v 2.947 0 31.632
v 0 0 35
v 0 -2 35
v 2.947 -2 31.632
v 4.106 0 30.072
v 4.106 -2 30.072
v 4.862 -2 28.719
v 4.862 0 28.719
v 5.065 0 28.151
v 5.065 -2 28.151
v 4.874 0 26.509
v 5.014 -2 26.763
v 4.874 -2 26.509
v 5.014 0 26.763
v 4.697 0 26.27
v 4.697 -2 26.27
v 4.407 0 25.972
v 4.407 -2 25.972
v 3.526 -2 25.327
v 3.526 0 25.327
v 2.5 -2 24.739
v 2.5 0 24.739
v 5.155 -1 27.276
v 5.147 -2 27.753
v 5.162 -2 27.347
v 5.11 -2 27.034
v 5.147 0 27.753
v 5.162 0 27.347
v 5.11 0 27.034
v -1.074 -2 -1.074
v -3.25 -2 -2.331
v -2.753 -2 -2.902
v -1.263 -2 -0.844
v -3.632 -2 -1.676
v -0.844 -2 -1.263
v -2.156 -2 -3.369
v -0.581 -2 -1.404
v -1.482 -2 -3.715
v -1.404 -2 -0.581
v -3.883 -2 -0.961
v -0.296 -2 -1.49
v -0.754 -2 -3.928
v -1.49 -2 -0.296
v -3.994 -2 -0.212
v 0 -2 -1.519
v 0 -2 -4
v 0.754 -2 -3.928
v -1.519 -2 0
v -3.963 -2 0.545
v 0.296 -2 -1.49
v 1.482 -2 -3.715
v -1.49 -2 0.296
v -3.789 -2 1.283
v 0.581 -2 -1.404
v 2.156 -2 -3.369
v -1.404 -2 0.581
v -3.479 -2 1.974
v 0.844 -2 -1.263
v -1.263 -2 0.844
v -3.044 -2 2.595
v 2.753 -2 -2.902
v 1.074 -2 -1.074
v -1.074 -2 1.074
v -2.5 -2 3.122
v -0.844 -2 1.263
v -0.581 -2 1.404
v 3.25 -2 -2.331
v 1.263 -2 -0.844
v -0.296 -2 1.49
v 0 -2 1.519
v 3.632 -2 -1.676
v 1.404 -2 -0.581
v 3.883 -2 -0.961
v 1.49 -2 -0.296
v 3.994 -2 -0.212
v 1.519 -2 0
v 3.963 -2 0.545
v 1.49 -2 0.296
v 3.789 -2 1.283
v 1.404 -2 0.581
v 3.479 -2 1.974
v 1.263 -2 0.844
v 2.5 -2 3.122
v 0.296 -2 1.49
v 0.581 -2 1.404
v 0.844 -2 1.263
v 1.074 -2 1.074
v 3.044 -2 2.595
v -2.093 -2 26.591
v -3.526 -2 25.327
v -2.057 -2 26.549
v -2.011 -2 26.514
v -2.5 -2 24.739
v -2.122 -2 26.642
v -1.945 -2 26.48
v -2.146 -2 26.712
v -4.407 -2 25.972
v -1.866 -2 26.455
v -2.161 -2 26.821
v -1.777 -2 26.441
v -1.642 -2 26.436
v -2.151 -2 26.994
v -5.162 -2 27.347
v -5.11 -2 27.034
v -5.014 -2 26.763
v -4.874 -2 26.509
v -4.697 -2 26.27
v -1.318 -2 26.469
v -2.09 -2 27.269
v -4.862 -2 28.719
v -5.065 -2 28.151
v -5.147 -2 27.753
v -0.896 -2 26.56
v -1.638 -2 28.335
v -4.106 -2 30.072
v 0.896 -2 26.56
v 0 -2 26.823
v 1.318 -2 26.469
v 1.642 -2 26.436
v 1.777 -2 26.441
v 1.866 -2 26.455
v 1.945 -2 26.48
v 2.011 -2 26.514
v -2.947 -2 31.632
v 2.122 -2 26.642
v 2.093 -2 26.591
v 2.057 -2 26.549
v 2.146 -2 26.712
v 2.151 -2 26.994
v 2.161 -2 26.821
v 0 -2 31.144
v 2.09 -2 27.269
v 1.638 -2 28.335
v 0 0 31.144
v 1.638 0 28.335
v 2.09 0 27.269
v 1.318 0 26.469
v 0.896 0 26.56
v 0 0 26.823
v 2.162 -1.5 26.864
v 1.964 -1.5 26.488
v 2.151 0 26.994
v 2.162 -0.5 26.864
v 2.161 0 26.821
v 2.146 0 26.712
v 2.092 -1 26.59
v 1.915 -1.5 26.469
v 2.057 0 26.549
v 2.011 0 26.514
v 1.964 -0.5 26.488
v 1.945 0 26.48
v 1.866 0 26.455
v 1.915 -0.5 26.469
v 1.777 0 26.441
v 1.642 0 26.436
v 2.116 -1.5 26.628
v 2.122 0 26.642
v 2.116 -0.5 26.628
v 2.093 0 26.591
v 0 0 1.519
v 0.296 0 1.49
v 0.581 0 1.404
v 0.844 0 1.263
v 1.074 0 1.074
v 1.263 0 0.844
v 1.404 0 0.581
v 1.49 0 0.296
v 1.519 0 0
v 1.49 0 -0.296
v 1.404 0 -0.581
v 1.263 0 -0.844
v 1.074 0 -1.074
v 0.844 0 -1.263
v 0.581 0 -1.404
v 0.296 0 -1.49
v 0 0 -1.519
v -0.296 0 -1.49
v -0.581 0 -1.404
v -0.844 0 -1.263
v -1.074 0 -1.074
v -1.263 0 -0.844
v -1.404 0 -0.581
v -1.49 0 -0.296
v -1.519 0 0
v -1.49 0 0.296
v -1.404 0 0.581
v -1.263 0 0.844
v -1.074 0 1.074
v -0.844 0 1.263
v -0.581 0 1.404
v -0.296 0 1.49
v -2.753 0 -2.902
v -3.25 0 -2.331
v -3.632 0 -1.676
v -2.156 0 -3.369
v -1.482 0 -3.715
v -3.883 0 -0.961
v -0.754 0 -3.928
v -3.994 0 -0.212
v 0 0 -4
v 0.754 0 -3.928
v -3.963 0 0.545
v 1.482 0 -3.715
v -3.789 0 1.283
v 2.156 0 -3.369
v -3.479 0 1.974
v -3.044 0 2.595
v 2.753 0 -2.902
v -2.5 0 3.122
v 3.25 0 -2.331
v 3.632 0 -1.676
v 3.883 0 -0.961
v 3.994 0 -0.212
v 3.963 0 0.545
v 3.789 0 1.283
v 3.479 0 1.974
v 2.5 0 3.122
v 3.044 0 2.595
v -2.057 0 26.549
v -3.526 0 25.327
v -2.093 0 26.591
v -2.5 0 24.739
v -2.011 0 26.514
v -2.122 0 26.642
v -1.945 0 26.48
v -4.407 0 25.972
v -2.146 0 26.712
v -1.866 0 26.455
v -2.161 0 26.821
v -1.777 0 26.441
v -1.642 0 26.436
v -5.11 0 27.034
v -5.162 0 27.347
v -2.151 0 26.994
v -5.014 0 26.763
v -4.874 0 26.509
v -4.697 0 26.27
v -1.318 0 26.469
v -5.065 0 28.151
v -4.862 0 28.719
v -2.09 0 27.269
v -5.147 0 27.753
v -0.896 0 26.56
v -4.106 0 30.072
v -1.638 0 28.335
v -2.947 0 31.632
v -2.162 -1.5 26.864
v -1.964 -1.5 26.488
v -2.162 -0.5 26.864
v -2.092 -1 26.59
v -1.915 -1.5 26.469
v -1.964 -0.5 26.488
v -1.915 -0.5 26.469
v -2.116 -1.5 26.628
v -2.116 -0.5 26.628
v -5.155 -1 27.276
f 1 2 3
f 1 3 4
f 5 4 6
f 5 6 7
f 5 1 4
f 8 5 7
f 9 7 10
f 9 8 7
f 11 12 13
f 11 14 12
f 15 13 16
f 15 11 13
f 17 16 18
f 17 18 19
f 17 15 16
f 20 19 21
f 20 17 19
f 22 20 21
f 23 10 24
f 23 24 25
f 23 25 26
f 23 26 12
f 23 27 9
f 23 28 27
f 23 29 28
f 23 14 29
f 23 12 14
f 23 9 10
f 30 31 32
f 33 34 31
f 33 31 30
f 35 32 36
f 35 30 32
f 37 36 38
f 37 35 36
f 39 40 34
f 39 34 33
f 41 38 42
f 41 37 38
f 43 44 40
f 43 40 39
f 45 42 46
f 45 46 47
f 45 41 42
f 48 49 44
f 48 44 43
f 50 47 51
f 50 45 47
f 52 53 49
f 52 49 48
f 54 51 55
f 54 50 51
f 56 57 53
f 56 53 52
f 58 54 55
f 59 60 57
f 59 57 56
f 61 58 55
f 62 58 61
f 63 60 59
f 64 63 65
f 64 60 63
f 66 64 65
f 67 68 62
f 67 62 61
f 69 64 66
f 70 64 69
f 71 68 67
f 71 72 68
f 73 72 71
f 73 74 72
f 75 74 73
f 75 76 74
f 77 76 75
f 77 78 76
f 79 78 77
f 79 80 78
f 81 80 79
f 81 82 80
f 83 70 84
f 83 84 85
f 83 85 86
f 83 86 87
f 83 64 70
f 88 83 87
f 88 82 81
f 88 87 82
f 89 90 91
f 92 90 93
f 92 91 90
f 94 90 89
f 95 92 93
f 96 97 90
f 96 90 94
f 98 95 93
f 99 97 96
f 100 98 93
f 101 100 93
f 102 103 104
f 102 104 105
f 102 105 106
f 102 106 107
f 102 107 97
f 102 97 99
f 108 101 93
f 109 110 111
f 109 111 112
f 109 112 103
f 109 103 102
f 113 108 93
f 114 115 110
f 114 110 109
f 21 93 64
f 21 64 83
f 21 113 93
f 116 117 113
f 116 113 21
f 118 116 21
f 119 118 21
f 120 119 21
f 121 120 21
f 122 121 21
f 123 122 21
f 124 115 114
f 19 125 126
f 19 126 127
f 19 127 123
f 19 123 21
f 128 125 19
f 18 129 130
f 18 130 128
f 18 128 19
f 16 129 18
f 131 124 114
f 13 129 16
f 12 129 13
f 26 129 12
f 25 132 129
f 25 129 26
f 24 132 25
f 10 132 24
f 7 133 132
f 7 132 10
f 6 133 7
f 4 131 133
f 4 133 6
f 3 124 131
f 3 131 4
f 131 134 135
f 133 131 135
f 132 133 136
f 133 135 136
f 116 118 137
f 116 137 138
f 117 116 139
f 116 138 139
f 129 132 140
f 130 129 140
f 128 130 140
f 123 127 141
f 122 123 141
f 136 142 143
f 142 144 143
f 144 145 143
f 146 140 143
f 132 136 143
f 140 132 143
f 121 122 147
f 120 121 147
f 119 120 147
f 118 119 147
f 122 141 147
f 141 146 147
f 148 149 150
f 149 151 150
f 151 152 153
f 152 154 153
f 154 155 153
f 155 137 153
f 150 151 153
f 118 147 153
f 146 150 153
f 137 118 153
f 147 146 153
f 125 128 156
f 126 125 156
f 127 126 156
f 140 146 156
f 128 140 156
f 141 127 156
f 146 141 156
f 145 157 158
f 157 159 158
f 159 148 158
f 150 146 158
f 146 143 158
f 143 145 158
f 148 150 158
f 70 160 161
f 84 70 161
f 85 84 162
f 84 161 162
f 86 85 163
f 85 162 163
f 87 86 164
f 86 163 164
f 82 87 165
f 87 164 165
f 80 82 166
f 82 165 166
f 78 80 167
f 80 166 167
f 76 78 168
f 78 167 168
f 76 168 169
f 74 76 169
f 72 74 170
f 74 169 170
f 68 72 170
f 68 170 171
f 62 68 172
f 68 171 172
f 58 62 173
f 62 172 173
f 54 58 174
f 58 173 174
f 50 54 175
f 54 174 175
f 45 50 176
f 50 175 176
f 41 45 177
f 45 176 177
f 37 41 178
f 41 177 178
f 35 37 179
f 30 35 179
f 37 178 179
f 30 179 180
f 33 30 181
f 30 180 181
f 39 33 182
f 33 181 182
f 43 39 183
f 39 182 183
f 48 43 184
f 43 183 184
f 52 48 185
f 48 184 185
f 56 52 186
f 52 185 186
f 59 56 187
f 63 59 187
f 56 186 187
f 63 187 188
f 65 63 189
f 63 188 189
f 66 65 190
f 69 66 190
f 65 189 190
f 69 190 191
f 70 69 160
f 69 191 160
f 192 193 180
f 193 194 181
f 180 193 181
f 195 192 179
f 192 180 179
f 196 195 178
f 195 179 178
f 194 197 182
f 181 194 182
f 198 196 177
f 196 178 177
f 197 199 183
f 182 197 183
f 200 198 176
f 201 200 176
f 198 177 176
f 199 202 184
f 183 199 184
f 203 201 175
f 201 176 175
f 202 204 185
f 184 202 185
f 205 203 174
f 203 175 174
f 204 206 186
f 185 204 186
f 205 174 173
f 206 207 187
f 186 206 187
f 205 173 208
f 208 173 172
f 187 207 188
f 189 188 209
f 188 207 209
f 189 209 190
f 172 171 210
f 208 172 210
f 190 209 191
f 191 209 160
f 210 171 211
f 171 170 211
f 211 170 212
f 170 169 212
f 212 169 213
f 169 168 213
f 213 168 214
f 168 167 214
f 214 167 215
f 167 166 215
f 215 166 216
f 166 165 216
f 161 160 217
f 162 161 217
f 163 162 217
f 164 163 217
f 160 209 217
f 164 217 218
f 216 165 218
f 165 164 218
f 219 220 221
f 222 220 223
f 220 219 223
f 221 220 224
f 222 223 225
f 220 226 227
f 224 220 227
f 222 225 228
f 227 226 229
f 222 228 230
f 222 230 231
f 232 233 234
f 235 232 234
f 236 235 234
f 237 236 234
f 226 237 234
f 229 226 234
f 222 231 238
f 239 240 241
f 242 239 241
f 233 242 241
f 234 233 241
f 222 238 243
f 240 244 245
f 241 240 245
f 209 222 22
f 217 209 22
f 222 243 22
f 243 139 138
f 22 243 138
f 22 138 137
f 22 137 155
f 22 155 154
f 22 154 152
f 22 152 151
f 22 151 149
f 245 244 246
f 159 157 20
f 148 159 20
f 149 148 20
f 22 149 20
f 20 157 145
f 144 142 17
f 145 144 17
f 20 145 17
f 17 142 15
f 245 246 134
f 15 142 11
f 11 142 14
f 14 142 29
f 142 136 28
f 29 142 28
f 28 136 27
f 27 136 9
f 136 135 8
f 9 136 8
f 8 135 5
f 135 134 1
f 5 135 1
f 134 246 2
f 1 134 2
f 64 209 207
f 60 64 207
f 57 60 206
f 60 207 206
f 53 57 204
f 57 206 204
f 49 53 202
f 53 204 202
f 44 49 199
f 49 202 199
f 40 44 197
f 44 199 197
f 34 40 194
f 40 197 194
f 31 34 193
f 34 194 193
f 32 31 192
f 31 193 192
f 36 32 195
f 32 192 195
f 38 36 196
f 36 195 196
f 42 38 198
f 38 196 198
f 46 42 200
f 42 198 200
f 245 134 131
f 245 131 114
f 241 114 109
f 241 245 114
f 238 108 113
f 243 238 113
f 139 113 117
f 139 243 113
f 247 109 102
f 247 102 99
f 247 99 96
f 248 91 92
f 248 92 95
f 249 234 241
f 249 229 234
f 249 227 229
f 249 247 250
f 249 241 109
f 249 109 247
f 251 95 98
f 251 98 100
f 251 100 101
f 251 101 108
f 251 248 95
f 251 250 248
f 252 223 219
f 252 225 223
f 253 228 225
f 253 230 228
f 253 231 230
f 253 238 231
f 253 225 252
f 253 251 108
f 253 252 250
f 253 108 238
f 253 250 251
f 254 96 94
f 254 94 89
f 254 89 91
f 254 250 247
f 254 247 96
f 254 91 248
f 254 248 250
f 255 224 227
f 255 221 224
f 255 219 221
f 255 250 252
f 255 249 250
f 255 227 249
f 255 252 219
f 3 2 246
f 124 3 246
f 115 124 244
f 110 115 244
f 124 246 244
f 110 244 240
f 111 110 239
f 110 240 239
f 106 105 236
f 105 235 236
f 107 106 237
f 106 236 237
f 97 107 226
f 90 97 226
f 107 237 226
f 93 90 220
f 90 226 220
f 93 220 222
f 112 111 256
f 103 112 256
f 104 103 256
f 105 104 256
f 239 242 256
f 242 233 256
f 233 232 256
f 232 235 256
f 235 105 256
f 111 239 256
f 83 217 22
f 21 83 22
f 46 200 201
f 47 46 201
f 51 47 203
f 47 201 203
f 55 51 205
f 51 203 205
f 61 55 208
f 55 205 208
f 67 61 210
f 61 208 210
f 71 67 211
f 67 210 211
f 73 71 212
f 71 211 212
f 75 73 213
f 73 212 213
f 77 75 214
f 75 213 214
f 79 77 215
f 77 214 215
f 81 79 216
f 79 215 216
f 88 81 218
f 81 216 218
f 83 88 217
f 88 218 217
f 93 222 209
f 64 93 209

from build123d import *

# Parameters (mm, degrees)
F1_DEPTH = 2


with BuildPart() as f1:
    # F0 (on Front) → F1 (new body)
    with BuildSketch(Plane.XZ):
        with BuildLine():
            Line((-2.5, 24.7390419245), (-2.5, 3.1224989992))
            ThreePointArc((-2.5, 3.1224989992), (-3.7742546282, -1.3247648854), (0, -4))
            ThreePointArc((0, -4), (3.7742546282, -1.3247648854), (2.5, 3.1224989992))
            Line((2.5, 3.1224989992), (2.5, 24.7390419245))
            add(Edge.make_bspline(
                [(0, 35), (2.6780768056, 32.0475395766), (7.0401936793, 27.2384997362), (3.7645832593, 25.4352175715), (2.5, 24.7390419245)],
                knots=[0, 0, 0, 0, 0.6139396742, 1, 1, 1, 1], degree=3))
            add(Edge.make_bspline(
                [(0, 35), (-2.6780768056, 32.0475395766), (-7.0401936793, 27.2384997362), (-3.7645832593, 25.4352175715), (-2.5, 24.7390419245)],
                knots=[0, 0, 0, 0, 0.6139396742, 1, 1, 1, 1], degree=3))
        make_face()
        with BuildLine():
            ThreePointArc((0, -1.5191429047), (-1.5191429047, 0), (0, 1.5191429047))
            ThreePointArc((0, 1.5191429047), (1.5191429047, 0), (0, -1.5191429047))
        make_face(mode=Mode.SUBTRACT)
        with BuildLine():
            add(Edge.make_bspline(
                [(0, 31.1435163021), (-1.2354901485, 29.1288048963), (-3.2717680855, 25.8082507742), (-0.9234860023, 26.5364242479), (0, 26.8227867782)],
                knots=[0, 0, 0, 0, 0.6067394335, 1, 1, 1, 1], degree=3))
            add(Edge.make_bspline(
                [(0, 31.1435163021), (1.2354901485, 29.1288048963), (3.2717680855, 25.8082507742), (0.9234860023, 26.5364242479), (0, 26.8227867782)],
                knots=[0, 0, 0, 0, 0.6067394335, 1, 1, 1, 1], degree=3))
        make_face(mode=Mode.SUBTRACT)
    extrude(amount=F1_DEPTH)


solid = f1.part
